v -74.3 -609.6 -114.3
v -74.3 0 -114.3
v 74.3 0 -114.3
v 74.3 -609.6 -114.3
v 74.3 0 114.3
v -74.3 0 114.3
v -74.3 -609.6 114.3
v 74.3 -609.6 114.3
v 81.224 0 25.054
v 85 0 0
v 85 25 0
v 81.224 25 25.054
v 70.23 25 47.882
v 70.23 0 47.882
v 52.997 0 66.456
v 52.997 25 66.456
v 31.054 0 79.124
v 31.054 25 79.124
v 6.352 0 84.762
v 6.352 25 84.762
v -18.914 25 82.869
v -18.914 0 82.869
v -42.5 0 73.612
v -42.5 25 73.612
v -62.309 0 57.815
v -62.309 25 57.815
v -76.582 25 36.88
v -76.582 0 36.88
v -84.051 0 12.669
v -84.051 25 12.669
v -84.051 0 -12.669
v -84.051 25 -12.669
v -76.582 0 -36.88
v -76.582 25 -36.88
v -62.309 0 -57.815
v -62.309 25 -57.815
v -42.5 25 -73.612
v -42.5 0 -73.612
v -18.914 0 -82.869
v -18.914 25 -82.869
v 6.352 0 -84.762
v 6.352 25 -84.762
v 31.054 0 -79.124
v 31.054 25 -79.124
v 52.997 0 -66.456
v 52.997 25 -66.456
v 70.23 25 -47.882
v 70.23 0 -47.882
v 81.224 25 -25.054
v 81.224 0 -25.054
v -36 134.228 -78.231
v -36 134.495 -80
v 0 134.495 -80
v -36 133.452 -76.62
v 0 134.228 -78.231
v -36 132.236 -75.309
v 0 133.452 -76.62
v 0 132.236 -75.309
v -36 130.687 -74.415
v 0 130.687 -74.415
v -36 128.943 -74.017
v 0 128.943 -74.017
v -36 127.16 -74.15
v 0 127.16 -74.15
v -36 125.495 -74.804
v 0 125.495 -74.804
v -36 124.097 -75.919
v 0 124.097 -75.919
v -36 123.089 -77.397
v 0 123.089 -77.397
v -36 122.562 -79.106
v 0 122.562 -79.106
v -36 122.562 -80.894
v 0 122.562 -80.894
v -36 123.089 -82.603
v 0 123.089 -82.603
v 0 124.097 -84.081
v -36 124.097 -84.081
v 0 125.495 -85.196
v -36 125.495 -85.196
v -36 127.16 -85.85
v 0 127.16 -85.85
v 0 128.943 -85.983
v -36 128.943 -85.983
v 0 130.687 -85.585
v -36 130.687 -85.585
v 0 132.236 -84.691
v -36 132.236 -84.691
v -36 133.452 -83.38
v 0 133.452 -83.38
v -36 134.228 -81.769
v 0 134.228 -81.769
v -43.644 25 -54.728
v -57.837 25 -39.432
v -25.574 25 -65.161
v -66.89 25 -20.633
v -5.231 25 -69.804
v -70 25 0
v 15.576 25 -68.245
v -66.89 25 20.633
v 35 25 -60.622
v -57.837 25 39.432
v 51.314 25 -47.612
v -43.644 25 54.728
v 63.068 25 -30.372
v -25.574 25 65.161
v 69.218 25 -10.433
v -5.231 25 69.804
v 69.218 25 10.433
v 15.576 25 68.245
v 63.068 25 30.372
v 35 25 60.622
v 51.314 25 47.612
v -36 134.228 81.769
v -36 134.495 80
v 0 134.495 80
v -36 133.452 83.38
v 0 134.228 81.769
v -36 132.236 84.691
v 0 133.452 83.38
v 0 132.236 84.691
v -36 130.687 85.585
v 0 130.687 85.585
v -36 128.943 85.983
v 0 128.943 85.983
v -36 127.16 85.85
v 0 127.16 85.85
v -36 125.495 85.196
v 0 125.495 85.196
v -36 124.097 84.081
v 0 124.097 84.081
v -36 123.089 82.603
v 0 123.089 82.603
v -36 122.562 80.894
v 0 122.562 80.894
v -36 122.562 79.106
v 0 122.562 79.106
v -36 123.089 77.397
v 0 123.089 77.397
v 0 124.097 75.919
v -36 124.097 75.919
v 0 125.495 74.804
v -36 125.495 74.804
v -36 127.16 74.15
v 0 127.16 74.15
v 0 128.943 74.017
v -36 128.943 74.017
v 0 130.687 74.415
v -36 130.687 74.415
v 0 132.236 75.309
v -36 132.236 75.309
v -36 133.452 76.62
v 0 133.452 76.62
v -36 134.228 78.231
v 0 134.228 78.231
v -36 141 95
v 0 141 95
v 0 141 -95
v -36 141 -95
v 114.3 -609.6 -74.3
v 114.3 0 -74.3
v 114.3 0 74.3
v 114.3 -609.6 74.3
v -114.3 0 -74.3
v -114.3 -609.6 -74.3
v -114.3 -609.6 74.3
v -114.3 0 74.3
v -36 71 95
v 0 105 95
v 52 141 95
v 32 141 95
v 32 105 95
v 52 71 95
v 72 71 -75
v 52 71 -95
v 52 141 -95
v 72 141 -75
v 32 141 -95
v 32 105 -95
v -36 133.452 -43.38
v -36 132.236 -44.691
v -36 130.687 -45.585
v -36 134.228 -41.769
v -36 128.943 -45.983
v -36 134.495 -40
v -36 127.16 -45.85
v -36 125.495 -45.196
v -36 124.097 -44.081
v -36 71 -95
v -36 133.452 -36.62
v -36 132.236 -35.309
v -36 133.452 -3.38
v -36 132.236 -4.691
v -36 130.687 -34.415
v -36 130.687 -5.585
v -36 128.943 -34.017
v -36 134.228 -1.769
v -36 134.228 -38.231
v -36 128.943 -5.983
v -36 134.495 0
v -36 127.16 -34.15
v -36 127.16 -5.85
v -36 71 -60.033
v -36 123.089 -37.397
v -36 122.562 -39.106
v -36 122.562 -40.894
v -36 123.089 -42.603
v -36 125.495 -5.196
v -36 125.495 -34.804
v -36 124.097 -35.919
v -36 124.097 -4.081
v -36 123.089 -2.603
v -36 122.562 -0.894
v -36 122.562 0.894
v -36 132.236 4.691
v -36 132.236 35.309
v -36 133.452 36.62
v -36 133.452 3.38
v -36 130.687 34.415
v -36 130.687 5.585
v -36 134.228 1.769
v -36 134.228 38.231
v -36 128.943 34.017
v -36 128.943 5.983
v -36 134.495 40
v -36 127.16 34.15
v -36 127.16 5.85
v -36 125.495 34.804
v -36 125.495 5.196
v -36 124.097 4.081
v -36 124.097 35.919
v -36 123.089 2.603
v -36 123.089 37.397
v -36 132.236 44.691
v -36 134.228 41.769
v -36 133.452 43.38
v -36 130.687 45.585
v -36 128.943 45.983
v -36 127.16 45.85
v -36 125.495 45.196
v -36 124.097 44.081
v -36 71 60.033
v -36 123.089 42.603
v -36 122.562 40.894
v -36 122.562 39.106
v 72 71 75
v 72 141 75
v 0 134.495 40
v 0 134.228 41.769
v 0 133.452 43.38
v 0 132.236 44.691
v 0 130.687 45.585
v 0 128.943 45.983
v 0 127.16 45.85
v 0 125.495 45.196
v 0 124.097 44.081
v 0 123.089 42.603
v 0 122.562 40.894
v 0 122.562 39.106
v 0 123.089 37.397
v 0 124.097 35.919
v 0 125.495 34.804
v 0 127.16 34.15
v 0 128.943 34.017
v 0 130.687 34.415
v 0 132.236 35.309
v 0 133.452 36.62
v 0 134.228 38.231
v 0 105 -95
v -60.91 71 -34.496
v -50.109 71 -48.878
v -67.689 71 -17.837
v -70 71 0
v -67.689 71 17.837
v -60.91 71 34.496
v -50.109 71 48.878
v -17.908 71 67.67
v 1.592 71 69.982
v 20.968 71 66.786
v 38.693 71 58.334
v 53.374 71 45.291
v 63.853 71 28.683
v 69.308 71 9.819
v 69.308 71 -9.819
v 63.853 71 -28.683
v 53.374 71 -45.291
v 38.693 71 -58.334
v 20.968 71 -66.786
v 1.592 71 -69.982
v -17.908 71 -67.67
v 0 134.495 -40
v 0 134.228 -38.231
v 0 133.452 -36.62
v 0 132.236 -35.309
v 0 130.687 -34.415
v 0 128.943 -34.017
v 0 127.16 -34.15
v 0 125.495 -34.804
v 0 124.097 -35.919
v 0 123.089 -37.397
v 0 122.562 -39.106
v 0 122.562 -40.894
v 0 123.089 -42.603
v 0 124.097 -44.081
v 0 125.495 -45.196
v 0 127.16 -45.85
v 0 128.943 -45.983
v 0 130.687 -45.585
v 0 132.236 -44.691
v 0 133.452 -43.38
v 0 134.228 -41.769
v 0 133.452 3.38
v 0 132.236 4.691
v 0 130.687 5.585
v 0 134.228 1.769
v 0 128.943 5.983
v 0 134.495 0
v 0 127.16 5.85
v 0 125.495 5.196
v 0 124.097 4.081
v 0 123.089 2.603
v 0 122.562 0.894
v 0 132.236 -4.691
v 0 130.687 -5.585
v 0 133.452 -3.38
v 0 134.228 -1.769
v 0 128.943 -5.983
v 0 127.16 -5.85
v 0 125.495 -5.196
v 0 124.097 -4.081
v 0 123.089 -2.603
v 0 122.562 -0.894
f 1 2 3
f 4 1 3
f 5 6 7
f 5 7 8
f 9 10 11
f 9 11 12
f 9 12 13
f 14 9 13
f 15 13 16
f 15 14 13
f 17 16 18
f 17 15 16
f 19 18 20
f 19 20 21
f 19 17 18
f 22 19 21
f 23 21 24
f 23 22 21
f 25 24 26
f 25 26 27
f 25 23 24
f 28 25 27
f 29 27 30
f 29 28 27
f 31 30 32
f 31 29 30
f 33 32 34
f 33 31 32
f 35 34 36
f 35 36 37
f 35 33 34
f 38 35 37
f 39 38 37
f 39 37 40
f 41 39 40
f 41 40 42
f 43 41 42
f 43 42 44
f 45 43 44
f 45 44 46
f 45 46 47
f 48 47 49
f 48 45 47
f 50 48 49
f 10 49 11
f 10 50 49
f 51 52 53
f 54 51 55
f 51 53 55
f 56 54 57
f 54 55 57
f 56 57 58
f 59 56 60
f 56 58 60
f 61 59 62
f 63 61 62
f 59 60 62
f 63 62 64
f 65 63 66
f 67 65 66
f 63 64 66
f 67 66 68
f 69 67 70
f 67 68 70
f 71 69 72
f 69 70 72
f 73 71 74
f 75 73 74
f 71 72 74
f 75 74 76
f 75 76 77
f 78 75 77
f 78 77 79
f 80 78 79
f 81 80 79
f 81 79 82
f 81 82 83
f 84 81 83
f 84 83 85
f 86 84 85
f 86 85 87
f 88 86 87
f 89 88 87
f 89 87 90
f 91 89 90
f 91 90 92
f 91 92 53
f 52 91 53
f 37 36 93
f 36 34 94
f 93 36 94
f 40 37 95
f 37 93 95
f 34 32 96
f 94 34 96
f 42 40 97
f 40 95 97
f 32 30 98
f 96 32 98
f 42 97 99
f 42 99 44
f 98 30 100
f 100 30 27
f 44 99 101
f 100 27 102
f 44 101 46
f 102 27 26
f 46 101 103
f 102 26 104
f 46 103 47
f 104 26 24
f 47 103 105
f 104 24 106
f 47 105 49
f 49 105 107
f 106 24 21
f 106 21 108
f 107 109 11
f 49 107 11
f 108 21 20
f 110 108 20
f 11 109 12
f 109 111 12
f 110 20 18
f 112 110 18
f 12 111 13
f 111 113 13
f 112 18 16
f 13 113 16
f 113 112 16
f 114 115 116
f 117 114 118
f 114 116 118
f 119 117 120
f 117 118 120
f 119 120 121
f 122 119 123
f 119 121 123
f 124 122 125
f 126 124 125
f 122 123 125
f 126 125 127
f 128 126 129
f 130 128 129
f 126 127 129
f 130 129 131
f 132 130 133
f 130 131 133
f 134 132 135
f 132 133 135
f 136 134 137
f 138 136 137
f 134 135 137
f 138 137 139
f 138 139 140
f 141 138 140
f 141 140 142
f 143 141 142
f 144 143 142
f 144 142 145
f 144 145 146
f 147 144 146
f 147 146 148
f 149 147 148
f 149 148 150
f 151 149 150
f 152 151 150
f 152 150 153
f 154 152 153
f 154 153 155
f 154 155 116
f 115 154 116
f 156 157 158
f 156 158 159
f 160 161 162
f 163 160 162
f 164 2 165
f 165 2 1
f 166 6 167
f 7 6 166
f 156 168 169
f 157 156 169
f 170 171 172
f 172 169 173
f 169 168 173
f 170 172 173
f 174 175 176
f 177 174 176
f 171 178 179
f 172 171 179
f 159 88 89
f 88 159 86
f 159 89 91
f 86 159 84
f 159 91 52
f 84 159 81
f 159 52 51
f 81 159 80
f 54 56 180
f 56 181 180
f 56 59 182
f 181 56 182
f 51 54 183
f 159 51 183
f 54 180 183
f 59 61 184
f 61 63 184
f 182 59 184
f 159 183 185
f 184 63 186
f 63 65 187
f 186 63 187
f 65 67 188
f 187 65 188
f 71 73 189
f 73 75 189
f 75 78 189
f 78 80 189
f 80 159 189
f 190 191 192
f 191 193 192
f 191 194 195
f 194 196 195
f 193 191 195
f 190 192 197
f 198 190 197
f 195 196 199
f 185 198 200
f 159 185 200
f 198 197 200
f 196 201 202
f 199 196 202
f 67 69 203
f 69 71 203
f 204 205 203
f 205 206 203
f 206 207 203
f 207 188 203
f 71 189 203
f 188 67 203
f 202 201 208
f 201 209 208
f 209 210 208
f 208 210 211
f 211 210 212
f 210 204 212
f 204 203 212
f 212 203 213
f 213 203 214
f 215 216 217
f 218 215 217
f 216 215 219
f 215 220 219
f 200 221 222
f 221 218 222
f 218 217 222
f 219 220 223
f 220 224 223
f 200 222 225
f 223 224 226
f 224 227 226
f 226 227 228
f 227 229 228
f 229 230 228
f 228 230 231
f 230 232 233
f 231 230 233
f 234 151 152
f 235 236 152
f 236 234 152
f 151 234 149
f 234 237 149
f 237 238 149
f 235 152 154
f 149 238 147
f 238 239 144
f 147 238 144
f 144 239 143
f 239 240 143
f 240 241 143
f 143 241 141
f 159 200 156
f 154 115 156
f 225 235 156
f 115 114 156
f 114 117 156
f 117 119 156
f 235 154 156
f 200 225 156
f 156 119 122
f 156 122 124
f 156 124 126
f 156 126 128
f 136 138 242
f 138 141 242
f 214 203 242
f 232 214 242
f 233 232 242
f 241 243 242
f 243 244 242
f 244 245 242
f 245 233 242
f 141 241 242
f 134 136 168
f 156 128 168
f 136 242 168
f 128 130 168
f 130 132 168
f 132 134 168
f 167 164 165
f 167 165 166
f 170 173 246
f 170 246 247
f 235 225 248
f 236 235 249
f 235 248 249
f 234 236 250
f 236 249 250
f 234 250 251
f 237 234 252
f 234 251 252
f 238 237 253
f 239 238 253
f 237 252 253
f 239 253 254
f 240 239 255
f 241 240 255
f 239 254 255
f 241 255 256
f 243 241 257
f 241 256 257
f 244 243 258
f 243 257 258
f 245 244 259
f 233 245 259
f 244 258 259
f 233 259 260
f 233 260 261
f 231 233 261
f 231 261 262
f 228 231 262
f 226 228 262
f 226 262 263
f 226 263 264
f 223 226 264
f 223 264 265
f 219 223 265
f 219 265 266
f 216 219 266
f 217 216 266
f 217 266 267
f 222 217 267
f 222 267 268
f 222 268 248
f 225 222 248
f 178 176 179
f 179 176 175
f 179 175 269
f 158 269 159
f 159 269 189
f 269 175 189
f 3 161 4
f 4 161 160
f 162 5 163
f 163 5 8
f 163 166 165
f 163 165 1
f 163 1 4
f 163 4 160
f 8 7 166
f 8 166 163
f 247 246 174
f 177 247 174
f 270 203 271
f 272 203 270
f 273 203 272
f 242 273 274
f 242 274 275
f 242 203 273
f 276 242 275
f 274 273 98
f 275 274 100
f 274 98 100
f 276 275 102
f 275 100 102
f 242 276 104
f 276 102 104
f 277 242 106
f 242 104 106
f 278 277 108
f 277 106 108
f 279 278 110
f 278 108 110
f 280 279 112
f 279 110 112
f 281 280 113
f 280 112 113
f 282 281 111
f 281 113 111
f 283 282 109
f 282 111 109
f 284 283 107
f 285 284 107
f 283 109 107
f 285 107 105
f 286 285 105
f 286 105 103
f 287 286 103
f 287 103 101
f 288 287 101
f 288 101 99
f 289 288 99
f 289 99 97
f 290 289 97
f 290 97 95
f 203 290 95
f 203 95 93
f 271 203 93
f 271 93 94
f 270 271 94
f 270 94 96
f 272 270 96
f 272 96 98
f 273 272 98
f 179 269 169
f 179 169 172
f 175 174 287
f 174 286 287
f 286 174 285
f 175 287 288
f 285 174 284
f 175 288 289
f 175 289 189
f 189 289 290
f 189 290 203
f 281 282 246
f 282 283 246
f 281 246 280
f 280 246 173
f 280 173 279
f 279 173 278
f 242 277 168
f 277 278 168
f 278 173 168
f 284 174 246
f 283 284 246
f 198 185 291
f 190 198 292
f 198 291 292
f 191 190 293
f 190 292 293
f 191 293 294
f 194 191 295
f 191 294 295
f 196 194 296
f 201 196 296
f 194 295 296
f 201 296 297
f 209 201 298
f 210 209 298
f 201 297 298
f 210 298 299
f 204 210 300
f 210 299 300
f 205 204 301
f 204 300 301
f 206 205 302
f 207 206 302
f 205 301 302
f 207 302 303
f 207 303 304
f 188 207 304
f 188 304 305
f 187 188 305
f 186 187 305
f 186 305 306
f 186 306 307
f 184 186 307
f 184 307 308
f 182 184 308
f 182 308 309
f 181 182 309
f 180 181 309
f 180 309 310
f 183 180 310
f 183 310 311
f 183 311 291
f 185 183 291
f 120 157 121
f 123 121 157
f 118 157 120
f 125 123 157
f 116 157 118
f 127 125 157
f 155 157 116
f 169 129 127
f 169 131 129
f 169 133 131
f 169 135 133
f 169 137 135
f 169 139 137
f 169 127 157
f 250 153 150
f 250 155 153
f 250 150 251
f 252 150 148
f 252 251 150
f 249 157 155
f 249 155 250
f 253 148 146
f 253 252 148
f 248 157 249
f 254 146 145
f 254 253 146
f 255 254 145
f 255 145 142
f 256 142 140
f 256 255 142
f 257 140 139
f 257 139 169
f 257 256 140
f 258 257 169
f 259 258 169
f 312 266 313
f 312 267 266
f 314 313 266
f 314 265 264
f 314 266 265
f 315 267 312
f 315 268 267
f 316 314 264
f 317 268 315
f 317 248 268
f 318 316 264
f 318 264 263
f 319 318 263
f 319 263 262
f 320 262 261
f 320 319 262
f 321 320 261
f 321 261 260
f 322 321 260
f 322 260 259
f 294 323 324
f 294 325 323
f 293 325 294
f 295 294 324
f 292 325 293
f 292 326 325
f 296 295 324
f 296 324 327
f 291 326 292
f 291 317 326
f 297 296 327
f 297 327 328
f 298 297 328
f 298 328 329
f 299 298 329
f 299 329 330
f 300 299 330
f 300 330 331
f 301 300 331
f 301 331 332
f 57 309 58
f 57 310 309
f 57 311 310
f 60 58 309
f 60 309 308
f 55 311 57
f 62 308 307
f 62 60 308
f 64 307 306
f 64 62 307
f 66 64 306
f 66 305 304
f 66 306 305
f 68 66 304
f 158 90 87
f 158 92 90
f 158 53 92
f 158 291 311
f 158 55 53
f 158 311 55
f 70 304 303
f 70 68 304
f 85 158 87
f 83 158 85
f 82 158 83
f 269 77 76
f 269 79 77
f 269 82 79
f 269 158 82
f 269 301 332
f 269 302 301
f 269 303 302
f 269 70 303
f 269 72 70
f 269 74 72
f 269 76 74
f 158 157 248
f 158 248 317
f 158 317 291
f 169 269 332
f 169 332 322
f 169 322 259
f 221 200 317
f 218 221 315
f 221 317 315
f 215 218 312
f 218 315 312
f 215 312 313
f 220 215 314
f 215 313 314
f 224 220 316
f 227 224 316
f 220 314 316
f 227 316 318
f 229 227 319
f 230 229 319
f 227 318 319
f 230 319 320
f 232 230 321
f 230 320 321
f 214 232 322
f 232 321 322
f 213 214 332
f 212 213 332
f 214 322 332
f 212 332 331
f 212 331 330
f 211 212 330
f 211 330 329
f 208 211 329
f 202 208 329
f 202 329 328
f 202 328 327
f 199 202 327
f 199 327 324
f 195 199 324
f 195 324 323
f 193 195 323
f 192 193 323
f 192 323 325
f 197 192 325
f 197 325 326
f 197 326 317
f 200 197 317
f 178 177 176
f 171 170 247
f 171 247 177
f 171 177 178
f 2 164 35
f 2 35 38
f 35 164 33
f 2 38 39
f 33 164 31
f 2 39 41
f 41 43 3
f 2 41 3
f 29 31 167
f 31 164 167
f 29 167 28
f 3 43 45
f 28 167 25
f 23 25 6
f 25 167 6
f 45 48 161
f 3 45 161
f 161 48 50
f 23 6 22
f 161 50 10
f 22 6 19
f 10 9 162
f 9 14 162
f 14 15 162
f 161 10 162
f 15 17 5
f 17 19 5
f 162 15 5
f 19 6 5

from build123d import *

# Parameters (mm, degrees)
F0_W      = 228.6
F0_H      = 228.6
F1_DEPTH  = 609.6
F3_SIZE   = 40
F4_R      = 85
F5_DEPTH  = 25
F6_R      = 70
F7_DEPTH  = 46
F9_DEPTH  = 70
F10_W     = 32
F10_H     = 45.417998
F11_DEPTH = 252
F12_SIZE  = 20
F14_D     = 12
F14_DEPTH = 40


with BuildPart() as f1:
    # F0 (on Front) → F1 (new body)
    with BuildSketch(Plane.XZ):
        Rectangle(F0_W, F0_H)
    extrude(amount=F1_DEPTH)

    # F3
    f3_edges = [f1.edges().sort_by_distance(p)[0] for p in [
        (114.3, -304.8, 114.3),
        (-114.3, -304.8, 114.3),
        (-114.3, -304.8, -114.3),
        (114.3, -304.8, -114.3),
    ]]
    chamfer(f3_edges, length=F3_SIZE)

    # F4 (on Front) → F5 (join)
    with BuildSketch(Plane.XZ):
        Circle(F4_R)
    extrude(amount=-F5_DEPTH)

    # F6 (on face) → F7 (join)
    with BuildSketch(Plane(origin=(0, 25, 0), x_dir=(-1, 0, 0), z_dir=(0, 1, 0))):
        Circle(F6_R)
    extrude(amount=F7_DEPTH)

    # F8 (on face) → F9 (join)
    with BuildSketch(Plane(origin=(0, 71, 0), x_dir=(-1, 0, 0), z_dir=(0, 1, 0))):
        Polygon((-32, 95), (-72, 95), (-72, -95), (-32, -95), (-32, 0), align=None)
        Polygon((0, 95), (-32, 95), (-32, 0), (-32, -95), (0, -95), (0, 0), align=None)
        Polygon((36, 95), (0, 95), (0, 0), (0, -95), (36, -95), align=None)
    extrude(amount=F9_DEPTH)

    # F10 (on face) → F11 (cut)
    with BuildSketch(Plane(origin=(0, 0, -95), x_dir=(1, 0, 0), z_dir=(0, 0, -1))):
        with Locations((16, -127.708999)):
            Rectangle(F10_W, F10_H)
    extrude(amount=-F11_DEPTH, mode=Mode.SUBTRACT)

    # F12
    f12_edges = [f1.edges().sort_by_distance(p)[0] for p in [
        (72, 106, -95),
        (72, 106, 95),
    ]]
    chamfer(f12_edges, length=F12_SIZE)

    # F14
    with Locations(Plane(origin=(-36, 0, 0), x_dir=(0, -1, 0), z_dir=(-1, 0, 0))):
        with Locations((-128.494948, 80), (-128.494948, 40), (-128.494948, 0), (-128.494948, -40), (-128.494948, -80)):
            Hole(F14_D / 2, depth=F14_DEPTH)


solid = f1.part
